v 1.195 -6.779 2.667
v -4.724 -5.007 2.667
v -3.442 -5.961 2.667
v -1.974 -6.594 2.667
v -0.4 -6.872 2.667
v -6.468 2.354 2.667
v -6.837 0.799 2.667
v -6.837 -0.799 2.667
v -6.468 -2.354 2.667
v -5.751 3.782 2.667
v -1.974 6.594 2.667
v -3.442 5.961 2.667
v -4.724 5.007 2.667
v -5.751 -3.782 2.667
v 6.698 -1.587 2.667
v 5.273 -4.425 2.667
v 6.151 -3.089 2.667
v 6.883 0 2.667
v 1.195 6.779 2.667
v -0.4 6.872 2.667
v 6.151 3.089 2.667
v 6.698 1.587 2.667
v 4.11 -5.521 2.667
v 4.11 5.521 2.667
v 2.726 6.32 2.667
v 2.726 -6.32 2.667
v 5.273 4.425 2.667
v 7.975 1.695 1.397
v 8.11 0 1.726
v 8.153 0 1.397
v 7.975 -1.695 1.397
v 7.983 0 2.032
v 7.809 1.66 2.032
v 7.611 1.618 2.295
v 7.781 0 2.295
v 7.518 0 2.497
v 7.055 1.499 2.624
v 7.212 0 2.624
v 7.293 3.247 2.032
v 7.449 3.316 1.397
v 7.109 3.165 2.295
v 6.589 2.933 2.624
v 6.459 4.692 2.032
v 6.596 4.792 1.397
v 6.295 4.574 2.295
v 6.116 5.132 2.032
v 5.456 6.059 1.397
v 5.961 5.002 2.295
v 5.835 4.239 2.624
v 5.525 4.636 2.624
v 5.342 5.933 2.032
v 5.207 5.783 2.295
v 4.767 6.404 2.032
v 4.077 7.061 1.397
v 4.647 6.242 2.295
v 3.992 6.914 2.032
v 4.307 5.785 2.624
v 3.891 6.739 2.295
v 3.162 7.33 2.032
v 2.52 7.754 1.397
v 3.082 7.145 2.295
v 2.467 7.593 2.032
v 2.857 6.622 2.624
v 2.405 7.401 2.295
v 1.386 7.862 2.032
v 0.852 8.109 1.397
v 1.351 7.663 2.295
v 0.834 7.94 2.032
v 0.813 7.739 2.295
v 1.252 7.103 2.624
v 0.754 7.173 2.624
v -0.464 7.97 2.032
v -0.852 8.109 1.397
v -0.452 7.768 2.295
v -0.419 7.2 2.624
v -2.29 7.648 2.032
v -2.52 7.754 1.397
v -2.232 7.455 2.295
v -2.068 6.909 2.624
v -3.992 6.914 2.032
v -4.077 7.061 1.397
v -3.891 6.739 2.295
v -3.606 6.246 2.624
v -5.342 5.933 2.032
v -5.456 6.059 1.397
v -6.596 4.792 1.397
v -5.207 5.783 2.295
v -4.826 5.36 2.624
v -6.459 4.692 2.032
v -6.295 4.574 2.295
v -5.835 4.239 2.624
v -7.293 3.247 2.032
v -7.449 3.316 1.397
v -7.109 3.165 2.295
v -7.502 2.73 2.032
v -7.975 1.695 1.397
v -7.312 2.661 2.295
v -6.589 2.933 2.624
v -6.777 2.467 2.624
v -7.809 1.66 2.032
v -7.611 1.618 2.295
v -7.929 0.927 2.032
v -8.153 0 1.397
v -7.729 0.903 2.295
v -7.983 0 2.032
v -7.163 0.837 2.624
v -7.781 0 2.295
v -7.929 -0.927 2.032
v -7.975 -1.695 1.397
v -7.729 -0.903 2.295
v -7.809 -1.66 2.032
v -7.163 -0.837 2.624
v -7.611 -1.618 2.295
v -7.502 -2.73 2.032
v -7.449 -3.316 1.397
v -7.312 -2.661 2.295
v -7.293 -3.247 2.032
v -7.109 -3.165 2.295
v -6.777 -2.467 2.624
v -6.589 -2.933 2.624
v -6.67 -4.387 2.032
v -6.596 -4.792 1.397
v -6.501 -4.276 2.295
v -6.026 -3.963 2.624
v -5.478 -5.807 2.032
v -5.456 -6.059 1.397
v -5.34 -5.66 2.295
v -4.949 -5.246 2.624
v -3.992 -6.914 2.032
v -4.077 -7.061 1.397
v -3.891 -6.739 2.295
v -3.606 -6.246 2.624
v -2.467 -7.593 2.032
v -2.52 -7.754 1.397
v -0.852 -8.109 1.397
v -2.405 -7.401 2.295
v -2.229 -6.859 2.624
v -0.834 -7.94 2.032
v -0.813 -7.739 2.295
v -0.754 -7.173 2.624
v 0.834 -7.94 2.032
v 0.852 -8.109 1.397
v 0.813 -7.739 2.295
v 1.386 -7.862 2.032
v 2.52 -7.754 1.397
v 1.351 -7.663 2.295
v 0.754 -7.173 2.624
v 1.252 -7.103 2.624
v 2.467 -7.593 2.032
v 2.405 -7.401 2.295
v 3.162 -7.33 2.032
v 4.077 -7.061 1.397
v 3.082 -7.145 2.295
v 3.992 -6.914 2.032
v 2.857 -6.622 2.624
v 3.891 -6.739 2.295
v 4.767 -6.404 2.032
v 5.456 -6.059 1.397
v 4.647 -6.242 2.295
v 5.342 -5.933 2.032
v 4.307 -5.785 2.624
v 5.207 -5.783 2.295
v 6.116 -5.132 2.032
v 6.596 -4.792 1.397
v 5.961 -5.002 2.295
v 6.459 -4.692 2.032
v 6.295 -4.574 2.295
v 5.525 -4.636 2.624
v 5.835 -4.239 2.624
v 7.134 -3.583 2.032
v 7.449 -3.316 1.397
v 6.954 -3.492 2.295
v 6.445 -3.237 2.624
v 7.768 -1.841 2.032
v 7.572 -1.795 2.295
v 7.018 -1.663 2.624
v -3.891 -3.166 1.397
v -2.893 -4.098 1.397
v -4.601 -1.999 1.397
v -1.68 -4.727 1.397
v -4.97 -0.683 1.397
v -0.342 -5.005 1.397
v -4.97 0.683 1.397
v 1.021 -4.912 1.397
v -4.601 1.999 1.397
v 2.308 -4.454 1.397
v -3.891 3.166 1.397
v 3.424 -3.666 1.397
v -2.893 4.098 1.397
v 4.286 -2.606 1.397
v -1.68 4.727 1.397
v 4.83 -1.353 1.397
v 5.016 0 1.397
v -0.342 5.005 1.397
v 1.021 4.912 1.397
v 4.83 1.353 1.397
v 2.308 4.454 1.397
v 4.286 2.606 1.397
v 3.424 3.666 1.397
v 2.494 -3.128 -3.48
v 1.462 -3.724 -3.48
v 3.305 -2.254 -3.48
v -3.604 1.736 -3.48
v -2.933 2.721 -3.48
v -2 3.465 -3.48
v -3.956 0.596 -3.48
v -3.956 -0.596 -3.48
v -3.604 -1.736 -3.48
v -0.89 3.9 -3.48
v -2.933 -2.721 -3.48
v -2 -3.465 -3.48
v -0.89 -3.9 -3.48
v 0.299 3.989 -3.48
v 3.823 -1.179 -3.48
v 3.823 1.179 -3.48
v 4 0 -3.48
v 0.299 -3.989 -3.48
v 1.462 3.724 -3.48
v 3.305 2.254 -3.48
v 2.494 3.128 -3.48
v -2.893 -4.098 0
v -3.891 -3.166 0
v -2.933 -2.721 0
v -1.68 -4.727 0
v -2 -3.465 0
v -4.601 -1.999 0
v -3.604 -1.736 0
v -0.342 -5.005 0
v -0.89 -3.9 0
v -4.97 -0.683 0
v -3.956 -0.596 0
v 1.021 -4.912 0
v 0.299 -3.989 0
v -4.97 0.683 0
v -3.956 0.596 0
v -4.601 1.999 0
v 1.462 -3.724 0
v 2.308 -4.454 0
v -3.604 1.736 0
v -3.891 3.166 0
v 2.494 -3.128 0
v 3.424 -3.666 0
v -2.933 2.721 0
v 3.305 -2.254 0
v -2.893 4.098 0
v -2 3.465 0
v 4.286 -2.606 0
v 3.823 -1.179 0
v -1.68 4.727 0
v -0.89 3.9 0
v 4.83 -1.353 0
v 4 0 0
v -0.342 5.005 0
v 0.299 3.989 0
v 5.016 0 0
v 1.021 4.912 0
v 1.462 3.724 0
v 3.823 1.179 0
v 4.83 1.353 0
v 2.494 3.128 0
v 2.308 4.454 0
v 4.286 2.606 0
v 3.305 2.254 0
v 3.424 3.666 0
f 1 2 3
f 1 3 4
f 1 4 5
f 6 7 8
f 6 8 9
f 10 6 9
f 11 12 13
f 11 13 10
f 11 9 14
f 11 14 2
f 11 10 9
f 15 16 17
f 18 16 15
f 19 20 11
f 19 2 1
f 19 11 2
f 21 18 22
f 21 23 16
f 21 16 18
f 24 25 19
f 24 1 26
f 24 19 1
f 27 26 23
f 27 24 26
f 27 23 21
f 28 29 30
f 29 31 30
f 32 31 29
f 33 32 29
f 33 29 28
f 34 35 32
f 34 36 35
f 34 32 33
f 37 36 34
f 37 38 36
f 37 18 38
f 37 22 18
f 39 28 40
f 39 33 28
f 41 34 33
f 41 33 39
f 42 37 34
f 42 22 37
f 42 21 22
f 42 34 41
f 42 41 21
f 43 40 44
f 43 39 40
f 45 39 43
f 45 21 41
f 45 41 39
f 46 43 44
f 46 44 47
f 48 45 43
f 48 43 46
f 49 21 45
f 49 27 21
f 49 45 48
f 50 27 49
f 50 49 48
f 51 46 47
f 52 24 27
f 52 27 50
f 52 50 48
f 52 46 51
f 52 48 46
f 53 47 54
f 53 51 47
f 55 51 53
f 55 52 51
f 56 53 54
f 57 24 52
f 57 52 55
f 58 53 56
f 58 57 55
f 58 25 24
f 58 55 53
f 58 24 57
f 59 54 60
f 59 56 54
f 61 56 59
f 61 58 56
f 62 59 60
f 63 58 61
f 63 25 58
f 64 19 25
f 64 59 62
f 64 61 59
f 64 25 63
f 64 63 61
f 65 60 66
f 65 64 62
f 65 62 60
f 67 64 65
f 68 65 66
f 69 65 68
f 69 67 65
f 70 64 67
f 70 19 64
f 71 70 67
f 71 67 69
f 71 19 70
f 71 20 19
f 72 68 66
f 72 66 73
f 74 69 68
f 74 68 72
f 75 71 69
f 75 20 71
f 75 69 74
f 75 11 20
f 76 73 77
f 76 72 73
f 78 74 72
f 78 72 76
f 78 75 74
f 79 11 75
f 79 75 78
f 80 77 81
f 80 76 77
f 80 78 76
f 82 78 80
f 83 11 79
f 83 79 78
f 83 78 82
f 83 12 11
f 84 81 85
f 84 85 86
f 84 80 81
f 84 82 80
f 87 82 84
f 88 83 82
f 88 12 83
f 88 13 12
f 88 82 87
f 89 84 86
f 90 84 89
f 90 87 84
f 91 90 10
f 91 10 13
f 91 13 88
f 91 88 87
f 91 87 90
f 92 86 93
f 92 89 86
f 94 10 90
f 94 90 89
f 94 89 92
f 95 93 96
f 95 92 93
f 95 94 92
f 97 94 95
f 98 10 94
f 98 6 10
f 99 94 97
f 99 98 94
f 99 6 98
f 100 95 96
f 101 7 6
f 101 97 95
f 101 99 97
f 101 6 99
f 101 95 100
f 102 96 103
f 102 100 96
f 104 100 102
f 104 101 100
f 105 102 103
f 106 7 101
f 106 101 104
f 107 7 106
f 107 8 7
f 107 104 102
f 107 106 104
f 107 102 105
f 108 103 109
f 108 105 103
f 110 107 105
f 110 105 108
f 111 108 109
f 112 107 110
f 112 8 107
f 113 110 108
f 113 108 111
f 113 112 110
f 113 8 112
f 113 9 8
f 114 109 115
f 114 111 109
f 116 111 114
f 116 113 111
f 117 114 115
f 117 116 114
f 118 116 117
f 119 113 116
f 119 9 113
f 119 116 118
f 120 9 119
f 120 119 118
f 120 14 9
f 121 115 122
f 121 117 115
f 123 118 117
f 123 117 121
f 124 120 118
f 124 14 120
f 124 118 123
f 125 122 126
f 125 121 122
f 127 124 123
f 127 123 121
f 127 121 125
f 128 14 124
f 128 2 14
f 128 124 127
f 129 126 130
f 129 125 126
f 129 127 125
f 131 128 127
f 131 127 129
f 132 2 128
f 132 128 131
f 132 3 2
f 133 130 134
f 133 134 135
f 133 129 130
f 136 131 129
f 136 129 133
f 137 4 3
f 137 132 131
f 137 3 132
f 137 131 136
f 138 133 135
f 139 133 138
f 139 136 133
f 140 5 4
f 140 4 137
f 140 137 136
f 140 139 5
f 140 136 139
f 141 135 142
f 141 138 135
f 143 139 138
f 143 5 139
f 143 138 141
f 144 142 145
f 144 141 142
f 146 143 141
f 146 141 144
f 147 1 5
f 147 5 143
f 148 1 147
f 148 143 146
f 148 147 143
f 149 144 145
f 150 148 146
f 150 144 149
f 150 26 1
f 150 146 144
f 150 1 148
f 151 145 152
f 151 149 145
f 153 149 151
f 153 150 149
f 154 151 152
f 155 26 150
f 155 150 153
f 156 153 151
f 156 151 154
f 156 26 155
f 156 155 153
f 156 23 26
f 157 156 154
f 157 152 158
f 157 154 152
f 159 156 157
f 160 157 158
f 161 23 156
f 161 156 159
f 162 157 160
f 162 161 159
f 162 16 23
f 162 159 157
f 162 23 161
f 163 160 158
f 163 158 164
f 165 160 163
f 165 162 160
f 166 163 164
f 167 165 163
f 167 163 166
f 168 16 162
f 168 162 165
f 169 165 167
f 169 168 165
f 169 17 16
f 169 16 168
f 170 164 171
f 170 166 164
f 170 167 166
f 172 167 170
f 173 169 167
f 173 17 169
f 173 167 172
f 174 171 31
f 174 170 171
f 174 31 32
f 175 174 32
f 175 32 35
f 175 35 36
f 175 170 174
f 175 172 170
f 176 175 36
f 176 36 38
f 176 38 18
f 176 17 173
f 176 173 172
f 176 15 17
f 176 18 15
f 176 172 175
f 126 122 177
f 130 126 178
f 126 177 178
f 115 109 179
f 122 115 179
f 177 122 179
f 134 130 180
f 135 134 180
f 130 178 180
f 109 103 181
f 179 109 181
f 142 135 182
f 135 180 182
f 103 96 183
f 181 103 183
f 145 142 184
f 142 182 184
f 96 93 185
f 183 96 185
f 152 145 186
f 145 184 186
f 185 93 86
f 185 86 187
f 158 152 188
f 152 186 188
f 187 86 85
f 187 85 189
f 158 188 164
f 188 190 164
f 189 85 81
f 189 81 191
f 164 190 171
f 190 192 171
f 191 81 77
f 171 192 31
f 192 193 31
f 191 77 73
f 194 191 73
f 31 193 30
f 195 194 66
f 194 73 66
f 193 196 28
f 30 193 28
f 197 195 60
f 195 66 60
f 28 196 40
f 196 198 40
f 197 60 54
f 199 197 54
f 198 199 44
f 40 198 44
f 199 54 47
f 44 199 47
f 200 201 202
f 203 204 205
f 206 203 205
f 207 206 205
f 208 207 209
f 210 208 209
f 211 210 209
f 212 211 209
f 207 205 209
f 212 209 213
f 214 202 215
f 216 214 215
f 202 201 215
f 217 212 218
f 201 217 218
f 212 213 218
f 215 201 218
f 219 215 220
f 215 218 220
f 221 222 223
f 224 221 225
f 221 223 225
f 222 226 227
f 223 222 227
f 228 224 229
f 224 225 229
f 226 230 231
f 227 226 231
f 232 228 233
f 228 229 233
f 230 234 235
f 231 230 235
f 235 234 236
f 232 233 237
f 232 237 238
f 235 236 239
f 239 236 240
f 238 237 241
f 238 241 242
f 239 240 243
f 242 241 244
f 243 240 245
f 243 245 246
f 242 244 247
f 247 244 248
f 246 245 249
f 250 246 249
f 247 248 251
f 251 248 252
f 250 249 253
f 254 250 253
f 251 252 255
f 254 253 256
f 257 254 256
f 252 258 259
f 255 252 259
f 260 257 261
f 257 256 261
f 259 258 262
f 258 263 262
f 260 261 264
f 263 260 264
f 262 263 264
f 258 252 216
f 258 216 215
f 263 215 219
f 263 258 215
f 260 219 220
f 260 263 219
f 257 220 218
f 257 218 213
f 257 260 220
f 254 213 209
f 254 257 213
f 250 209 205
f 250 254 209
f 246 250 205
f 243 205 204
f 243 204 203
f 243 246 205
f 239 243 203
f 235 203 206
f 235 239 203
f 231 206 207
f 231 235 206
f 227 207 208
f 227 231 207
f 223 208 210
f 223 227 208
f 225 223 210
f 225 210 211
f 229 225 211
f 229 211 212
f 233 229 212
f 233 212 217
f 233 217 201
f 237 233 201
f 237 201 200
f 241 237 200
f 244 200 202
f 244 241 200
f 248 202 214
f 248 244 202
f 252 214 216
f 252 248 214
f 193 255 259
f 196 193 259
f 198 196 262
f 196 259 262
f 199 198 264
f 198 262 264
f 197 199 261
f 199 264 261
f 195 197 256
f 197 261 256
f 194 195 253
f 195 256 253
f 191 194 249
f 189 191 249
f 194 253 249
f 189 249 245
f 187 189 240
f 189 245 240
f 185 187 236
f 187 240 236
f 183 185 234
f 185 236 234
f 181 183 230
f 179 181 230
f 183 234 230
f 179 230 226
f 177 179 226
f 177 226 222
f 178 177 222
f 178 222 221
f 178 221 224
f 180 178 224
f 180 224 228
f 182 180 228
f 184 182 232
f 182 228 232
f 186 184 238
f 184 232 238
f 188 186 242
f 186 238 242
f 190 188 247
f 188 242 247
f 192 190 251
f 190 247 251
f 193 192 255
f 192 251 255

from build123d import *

# Parameters (mm, degrees)
F0_R     = 4.0005
F1_DEPTH = 3.4798
F0_R_2   = 5.0165
F2_DEPTH = 1.397
F3_R     = 8.1534
F3_R_2   = 5.0165
F4_DEPTH = 1.27
F5_R     = 1.26999


# Not quite as in the source:
# - a fillet or chamfer is up to 0.001 mm smaller than in the source, because OpenCascade refuses the exact size


with BuildPart() as f1:
    # F0 (on Top) → F1 (new body)
    with BuildSketch(Plane.XY):
        Circle(F0_R)
    extrude(amount=-F1_DEPTH)

    # F0 (on Top) → F2 (join)
    with BuildSketch(Plane.XY):
        Circle(F0_R_2)
        Circle(F0_R, mode=Mode.SUBTRACT)
        Circle(F0_R)
    extrude(amount=F2_DEPTH)

    # F3 (on face) → F4 (join)
    with BuildSketch(Plane.XY.offset(1.397)):
        Circle(F3_R)
        Circle(F3_R_2, mode=Mode.SUBTRACT)
        Circle(F3_R_2)
    extrude(amount=F4_DEPTH)

    # F5 (radius 1.27 in the source; OpenCascade refuses exactly that, so slightly less here)
    f5_edges = [f1.edges().sort_by_distance(p)[0] for p in [
        (-8.1534, 0, 2.667),
    ]]
    fillet(f5_edges, radius=F5_R)


solid = f1.part
